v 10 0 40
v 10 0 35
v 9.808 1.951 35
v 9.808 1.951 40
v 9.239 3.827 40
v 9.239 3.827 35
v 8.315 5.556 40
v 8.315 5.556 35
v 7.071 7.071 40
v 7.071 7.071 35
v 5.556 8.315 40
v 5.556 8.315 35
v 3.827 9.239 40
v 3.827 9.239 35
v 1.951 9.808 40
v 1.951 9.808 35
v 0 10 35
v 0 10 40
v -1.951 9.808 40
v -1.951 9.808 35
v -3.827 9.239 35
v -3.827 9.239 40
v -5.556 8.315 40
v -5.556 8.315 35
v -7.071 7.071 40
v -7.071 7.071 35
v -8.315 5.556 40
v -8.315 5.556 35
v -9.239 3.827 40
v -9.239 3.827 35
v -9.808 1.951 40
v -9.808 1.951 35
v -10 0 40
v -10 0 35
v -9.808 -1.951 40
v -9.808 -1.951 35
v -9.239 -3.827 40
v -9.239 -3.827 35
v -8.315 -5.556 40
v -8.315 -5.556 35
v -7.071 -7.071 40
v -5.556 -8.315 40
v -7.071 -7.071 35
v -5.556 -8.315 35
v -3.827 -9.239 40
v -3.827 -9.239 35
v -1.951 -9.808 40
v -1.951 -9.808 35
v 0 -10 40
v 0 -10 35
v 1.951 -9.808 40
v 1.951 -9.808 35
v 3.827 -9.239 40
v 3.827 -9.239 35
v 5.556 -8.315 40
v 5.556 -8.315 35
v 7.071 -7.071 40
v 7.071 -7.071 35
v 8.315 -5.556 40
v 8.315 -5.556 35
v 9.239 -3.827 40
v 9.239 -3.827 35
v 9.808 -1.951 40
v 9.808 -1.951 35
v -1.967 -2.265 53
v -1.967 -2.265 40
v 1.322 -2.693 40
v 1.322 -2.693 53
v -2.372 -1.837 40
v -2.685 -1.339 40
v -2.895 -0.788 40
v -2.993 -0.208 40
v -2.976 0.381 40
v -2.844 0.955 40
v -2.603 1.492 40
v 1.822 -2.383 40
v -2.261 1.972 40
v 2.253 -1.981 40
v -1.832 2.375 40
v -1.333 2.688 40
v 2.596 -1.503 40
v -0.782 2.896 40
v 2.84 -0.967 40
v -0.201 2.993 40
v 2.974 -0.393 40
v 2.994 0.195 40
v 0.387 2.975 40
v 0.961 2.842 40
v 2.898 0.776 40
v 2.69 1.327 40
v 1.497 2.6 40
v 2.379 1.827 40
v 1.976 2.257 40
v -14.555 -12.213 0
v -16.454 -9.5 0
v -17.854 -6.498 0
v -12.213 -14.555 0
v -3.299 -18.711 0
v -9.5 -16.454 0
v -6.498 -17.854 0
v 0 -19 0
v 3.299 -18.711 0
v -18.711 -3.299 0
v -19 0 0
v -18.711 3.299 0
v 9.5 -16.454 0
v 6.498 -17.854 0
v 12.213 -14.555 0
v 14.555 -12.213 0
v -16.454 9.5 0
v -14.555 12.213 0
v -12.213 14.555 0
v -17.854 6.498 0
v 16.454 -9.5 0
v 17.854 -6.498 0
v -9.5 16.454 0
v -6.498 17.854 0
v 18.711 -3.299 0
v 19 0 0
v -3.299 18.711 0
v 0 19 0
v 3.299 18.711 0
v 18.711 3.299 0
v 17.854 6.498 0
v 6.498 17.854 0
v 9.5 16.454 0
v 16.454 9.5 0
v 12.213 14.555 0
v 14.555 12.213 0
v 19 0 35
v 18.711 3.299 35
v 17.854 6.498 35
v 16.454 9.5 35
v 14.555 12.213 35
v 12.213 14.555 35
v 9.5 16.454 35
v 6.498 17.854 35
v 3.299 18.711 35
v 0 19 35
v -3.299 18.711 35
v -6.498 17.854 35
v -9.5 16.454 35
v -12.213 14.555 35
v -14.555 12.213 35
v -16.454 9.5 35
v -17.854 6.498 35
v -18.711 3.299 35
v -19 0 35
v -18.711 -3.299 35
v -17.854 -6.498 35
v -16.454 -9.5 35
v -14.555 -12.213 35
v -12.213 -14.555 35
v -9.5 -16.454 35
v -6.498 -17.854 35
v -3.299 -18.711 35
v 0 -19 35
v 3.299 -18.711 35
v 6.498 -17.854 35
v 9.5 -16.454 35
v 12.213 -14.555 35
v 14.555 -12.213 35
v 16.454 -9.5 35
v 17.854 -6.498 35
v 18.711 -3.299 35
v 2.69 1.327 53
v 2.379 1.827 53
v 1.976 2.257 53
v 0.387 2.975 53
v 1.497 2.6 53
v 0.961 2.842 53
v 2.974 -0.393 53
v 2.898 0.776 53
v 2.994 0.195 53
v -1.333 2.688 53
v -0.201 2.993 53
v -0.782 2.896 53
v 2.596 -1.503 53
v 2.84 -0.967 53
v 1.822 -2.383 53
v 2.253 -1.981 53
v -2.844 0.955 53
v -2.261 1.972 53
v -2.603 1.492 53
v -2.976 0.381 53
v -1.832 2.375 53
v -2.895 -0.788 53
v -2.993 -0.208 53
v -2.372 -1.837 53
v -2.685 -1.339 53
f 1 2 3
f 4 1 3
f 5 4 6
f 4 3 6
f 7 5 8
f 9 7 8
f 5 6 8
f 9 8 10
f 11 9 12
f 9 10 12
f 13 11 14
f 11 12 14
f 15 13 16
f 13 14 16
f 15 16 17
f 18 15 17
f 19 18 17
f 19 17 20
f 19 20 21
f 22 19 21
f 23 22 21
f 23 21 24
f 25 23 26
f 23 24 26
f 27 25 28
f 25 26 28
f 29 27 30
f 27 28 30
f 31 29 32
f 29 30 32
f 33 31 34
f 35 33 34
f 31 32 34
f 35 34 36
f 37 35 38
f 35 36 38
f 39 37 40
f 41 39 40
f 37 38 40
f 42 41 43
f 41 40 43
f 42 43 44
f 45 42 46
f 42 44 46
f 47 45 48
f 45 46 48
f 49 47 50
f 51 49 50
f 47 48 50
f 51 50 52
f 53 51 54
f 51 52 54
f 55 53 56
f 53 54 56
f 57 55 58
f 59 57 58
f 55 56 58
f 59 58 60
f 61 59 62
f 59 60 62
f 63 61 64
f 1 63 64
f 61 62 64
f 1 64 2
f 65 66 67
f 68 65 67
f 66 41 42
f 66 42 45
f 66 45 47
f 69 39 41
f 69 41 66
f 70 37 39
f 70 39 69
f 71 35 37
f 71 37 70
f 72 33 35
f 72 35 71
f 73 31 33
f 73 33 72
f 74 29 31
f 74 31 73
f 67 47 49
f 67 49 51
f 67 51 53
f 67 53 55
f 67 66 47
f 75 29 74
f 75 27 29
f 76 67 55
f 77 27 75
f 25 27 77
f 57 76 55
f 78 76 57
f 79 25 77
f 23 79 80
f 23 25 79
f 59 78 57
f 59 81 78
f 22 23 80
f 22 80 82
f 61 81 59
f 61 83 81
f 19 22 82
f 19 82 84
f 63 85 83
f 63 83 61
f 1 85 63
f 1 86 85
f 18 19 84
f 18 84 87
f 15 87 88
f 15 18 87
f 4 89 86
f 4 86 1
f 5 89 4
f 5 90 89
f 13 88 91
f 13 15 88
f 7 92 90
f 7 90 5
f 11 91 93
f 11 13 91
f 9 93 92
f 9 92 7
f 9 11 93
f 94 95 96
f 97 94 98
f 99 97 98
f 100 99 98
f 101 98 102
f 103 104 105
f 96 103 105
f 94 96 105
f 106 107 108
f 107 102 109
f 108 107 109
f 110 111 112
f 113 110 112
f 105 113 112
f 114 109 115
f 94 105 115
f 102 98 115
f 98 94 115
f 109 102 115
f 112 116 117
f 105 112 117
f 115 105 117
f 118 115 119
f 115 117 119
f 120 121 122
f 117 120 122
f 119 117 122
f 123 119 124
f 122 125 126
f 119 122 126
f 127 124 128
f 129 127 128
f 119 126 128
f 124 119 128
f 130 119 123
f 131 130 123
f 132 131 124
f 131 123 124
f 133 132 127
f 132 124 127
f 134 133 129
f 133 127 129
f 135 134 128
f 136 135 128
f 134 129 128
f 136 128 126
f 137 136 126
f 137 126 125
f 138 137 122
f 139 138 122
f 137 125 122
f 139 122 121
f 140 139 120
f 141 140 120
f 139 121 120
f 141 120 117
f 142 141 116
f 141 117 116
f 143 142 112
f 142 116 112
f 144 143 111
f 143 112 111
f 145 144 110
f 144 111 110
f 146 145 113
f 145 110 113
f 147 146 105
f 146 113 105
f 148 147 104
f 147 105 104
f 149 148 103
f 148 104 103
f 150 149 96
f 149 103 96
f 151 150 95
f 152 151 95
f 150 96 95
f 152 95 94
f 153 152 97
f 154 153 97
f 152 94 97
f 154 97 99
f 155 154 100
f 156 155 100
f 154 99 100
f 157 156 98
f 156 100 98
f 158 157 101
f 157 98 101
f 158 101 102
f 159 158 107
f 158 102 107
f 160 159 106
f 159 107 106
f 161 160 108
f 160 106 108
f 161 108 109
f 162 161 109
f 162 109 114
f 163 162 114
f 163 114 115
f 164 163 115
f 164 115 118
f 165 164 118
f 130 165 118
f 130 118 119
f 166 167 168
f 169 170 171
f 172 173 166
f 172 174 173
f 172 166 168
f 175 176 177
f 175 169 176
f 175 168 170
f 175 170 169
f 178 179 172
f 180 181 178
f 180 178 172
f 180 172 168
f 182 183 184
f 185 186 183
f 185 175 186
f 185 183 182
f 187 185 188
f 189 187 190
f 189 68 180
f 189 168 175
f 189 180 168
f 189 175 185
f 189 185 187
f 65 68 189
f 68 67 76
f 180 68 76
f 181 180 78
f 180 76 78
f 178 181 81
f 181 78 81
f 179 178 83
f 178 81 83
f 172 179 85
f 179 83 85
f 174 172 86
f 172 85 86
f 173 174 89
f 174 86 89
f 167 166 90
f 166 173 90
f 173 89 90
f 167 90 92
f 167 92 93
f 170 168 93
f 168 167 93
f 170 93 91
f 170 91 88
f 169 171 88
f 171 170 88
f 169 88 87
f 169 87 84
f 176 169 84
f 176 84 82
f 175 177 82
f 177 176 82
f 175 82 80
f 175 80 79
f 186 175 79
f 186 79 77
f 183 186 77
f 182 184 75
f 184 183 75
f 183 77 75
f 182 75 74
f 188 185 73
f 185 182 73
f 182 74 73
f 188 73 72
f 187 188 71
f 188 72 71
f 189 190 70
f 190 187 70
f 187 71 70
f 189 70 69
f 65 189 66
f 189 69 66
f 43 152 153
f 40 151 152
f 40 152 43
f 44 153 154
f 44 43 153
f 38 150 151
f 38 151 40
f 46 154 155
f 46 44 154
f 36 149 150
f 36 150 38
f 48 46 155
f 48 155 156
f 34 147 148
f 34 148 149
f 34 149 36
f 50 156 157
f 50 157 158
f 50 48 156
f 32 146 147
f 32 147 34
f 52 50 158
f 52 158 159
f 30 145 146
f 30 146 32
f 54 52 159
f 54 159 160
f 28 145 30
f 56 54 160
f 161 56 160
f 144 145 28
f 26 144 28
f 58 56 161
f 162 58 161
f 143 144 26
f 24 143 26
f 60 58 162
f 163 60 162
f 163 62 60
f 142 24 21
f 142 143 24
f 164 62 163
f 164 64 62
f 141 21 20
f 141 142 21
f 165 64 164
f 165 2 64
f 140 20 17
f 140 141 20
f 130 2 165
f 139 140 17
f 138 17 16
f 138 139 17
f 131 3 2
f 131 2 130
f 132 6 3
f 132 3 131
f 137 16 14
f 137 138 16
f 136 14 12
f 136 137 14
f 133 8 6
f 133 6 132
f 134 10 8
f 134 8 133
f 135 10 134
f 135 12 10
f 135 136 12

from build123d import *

# Parameters (mm, degrees)
SKETCH1_R           = 19
BOSS_EXTRUDE1_DEPTH = 35
SKETCH2_R           = 10
BOSS_EXTRUDE2_DEPTH = 5
SKETCH3_R           = 3
BOSS_EXTRUDE3_DEPTH = 13
CUT_EXTRUDE1_START  = -13
CUT_EXTRUDE1_DEPTH  = 13


with BuildPart() as part:
    # Sketch1 → Boss-Extrude1 (new body)
    with BuildSketch(Plane.XY):
        Circle(SKETCH1_R)
    extrude(amount=BOSS_EXTRUDE1_DEPTH)

    # Sketch2 → Boss-Extrude2 (add)
    with BuildSketch(Plane.XY.offset(35)):
        Circle(SKETCH2_R)
    extrude(amount=BOSS_EXTRUDE2_DEPTH)

    # Sketch3 → Boss-Extrude3 (add)
    with BuildSketch(Plane.XY.offset(40)):
        with Locations(Location((0, 0, 0), (0, 0, 180))):
            Circle(SKETCH3_R)
    extrude(amount=BOSS_EXTRUDE3_DEPTH)

    # Sketch4 → Cut-Extrude1 (cut)
    with BuildSketch(Plane.XY.offset(53).offset(CUT_EXTRUDE1_START)):
        with BuildLine():
            Line((-1.967057229, -2.265101733), (1.321836789, -2.693092554))
            ThreePointArc((1.321836789, -2.693092554), (-0.387132264, -2.974916572), (-1.967057229, -2.265101733))
        make_face()
    extrude(amount=CUT_EXTRUDE1_DEPTH, mode=Mode.SUBTRACT)


solid = part.part
